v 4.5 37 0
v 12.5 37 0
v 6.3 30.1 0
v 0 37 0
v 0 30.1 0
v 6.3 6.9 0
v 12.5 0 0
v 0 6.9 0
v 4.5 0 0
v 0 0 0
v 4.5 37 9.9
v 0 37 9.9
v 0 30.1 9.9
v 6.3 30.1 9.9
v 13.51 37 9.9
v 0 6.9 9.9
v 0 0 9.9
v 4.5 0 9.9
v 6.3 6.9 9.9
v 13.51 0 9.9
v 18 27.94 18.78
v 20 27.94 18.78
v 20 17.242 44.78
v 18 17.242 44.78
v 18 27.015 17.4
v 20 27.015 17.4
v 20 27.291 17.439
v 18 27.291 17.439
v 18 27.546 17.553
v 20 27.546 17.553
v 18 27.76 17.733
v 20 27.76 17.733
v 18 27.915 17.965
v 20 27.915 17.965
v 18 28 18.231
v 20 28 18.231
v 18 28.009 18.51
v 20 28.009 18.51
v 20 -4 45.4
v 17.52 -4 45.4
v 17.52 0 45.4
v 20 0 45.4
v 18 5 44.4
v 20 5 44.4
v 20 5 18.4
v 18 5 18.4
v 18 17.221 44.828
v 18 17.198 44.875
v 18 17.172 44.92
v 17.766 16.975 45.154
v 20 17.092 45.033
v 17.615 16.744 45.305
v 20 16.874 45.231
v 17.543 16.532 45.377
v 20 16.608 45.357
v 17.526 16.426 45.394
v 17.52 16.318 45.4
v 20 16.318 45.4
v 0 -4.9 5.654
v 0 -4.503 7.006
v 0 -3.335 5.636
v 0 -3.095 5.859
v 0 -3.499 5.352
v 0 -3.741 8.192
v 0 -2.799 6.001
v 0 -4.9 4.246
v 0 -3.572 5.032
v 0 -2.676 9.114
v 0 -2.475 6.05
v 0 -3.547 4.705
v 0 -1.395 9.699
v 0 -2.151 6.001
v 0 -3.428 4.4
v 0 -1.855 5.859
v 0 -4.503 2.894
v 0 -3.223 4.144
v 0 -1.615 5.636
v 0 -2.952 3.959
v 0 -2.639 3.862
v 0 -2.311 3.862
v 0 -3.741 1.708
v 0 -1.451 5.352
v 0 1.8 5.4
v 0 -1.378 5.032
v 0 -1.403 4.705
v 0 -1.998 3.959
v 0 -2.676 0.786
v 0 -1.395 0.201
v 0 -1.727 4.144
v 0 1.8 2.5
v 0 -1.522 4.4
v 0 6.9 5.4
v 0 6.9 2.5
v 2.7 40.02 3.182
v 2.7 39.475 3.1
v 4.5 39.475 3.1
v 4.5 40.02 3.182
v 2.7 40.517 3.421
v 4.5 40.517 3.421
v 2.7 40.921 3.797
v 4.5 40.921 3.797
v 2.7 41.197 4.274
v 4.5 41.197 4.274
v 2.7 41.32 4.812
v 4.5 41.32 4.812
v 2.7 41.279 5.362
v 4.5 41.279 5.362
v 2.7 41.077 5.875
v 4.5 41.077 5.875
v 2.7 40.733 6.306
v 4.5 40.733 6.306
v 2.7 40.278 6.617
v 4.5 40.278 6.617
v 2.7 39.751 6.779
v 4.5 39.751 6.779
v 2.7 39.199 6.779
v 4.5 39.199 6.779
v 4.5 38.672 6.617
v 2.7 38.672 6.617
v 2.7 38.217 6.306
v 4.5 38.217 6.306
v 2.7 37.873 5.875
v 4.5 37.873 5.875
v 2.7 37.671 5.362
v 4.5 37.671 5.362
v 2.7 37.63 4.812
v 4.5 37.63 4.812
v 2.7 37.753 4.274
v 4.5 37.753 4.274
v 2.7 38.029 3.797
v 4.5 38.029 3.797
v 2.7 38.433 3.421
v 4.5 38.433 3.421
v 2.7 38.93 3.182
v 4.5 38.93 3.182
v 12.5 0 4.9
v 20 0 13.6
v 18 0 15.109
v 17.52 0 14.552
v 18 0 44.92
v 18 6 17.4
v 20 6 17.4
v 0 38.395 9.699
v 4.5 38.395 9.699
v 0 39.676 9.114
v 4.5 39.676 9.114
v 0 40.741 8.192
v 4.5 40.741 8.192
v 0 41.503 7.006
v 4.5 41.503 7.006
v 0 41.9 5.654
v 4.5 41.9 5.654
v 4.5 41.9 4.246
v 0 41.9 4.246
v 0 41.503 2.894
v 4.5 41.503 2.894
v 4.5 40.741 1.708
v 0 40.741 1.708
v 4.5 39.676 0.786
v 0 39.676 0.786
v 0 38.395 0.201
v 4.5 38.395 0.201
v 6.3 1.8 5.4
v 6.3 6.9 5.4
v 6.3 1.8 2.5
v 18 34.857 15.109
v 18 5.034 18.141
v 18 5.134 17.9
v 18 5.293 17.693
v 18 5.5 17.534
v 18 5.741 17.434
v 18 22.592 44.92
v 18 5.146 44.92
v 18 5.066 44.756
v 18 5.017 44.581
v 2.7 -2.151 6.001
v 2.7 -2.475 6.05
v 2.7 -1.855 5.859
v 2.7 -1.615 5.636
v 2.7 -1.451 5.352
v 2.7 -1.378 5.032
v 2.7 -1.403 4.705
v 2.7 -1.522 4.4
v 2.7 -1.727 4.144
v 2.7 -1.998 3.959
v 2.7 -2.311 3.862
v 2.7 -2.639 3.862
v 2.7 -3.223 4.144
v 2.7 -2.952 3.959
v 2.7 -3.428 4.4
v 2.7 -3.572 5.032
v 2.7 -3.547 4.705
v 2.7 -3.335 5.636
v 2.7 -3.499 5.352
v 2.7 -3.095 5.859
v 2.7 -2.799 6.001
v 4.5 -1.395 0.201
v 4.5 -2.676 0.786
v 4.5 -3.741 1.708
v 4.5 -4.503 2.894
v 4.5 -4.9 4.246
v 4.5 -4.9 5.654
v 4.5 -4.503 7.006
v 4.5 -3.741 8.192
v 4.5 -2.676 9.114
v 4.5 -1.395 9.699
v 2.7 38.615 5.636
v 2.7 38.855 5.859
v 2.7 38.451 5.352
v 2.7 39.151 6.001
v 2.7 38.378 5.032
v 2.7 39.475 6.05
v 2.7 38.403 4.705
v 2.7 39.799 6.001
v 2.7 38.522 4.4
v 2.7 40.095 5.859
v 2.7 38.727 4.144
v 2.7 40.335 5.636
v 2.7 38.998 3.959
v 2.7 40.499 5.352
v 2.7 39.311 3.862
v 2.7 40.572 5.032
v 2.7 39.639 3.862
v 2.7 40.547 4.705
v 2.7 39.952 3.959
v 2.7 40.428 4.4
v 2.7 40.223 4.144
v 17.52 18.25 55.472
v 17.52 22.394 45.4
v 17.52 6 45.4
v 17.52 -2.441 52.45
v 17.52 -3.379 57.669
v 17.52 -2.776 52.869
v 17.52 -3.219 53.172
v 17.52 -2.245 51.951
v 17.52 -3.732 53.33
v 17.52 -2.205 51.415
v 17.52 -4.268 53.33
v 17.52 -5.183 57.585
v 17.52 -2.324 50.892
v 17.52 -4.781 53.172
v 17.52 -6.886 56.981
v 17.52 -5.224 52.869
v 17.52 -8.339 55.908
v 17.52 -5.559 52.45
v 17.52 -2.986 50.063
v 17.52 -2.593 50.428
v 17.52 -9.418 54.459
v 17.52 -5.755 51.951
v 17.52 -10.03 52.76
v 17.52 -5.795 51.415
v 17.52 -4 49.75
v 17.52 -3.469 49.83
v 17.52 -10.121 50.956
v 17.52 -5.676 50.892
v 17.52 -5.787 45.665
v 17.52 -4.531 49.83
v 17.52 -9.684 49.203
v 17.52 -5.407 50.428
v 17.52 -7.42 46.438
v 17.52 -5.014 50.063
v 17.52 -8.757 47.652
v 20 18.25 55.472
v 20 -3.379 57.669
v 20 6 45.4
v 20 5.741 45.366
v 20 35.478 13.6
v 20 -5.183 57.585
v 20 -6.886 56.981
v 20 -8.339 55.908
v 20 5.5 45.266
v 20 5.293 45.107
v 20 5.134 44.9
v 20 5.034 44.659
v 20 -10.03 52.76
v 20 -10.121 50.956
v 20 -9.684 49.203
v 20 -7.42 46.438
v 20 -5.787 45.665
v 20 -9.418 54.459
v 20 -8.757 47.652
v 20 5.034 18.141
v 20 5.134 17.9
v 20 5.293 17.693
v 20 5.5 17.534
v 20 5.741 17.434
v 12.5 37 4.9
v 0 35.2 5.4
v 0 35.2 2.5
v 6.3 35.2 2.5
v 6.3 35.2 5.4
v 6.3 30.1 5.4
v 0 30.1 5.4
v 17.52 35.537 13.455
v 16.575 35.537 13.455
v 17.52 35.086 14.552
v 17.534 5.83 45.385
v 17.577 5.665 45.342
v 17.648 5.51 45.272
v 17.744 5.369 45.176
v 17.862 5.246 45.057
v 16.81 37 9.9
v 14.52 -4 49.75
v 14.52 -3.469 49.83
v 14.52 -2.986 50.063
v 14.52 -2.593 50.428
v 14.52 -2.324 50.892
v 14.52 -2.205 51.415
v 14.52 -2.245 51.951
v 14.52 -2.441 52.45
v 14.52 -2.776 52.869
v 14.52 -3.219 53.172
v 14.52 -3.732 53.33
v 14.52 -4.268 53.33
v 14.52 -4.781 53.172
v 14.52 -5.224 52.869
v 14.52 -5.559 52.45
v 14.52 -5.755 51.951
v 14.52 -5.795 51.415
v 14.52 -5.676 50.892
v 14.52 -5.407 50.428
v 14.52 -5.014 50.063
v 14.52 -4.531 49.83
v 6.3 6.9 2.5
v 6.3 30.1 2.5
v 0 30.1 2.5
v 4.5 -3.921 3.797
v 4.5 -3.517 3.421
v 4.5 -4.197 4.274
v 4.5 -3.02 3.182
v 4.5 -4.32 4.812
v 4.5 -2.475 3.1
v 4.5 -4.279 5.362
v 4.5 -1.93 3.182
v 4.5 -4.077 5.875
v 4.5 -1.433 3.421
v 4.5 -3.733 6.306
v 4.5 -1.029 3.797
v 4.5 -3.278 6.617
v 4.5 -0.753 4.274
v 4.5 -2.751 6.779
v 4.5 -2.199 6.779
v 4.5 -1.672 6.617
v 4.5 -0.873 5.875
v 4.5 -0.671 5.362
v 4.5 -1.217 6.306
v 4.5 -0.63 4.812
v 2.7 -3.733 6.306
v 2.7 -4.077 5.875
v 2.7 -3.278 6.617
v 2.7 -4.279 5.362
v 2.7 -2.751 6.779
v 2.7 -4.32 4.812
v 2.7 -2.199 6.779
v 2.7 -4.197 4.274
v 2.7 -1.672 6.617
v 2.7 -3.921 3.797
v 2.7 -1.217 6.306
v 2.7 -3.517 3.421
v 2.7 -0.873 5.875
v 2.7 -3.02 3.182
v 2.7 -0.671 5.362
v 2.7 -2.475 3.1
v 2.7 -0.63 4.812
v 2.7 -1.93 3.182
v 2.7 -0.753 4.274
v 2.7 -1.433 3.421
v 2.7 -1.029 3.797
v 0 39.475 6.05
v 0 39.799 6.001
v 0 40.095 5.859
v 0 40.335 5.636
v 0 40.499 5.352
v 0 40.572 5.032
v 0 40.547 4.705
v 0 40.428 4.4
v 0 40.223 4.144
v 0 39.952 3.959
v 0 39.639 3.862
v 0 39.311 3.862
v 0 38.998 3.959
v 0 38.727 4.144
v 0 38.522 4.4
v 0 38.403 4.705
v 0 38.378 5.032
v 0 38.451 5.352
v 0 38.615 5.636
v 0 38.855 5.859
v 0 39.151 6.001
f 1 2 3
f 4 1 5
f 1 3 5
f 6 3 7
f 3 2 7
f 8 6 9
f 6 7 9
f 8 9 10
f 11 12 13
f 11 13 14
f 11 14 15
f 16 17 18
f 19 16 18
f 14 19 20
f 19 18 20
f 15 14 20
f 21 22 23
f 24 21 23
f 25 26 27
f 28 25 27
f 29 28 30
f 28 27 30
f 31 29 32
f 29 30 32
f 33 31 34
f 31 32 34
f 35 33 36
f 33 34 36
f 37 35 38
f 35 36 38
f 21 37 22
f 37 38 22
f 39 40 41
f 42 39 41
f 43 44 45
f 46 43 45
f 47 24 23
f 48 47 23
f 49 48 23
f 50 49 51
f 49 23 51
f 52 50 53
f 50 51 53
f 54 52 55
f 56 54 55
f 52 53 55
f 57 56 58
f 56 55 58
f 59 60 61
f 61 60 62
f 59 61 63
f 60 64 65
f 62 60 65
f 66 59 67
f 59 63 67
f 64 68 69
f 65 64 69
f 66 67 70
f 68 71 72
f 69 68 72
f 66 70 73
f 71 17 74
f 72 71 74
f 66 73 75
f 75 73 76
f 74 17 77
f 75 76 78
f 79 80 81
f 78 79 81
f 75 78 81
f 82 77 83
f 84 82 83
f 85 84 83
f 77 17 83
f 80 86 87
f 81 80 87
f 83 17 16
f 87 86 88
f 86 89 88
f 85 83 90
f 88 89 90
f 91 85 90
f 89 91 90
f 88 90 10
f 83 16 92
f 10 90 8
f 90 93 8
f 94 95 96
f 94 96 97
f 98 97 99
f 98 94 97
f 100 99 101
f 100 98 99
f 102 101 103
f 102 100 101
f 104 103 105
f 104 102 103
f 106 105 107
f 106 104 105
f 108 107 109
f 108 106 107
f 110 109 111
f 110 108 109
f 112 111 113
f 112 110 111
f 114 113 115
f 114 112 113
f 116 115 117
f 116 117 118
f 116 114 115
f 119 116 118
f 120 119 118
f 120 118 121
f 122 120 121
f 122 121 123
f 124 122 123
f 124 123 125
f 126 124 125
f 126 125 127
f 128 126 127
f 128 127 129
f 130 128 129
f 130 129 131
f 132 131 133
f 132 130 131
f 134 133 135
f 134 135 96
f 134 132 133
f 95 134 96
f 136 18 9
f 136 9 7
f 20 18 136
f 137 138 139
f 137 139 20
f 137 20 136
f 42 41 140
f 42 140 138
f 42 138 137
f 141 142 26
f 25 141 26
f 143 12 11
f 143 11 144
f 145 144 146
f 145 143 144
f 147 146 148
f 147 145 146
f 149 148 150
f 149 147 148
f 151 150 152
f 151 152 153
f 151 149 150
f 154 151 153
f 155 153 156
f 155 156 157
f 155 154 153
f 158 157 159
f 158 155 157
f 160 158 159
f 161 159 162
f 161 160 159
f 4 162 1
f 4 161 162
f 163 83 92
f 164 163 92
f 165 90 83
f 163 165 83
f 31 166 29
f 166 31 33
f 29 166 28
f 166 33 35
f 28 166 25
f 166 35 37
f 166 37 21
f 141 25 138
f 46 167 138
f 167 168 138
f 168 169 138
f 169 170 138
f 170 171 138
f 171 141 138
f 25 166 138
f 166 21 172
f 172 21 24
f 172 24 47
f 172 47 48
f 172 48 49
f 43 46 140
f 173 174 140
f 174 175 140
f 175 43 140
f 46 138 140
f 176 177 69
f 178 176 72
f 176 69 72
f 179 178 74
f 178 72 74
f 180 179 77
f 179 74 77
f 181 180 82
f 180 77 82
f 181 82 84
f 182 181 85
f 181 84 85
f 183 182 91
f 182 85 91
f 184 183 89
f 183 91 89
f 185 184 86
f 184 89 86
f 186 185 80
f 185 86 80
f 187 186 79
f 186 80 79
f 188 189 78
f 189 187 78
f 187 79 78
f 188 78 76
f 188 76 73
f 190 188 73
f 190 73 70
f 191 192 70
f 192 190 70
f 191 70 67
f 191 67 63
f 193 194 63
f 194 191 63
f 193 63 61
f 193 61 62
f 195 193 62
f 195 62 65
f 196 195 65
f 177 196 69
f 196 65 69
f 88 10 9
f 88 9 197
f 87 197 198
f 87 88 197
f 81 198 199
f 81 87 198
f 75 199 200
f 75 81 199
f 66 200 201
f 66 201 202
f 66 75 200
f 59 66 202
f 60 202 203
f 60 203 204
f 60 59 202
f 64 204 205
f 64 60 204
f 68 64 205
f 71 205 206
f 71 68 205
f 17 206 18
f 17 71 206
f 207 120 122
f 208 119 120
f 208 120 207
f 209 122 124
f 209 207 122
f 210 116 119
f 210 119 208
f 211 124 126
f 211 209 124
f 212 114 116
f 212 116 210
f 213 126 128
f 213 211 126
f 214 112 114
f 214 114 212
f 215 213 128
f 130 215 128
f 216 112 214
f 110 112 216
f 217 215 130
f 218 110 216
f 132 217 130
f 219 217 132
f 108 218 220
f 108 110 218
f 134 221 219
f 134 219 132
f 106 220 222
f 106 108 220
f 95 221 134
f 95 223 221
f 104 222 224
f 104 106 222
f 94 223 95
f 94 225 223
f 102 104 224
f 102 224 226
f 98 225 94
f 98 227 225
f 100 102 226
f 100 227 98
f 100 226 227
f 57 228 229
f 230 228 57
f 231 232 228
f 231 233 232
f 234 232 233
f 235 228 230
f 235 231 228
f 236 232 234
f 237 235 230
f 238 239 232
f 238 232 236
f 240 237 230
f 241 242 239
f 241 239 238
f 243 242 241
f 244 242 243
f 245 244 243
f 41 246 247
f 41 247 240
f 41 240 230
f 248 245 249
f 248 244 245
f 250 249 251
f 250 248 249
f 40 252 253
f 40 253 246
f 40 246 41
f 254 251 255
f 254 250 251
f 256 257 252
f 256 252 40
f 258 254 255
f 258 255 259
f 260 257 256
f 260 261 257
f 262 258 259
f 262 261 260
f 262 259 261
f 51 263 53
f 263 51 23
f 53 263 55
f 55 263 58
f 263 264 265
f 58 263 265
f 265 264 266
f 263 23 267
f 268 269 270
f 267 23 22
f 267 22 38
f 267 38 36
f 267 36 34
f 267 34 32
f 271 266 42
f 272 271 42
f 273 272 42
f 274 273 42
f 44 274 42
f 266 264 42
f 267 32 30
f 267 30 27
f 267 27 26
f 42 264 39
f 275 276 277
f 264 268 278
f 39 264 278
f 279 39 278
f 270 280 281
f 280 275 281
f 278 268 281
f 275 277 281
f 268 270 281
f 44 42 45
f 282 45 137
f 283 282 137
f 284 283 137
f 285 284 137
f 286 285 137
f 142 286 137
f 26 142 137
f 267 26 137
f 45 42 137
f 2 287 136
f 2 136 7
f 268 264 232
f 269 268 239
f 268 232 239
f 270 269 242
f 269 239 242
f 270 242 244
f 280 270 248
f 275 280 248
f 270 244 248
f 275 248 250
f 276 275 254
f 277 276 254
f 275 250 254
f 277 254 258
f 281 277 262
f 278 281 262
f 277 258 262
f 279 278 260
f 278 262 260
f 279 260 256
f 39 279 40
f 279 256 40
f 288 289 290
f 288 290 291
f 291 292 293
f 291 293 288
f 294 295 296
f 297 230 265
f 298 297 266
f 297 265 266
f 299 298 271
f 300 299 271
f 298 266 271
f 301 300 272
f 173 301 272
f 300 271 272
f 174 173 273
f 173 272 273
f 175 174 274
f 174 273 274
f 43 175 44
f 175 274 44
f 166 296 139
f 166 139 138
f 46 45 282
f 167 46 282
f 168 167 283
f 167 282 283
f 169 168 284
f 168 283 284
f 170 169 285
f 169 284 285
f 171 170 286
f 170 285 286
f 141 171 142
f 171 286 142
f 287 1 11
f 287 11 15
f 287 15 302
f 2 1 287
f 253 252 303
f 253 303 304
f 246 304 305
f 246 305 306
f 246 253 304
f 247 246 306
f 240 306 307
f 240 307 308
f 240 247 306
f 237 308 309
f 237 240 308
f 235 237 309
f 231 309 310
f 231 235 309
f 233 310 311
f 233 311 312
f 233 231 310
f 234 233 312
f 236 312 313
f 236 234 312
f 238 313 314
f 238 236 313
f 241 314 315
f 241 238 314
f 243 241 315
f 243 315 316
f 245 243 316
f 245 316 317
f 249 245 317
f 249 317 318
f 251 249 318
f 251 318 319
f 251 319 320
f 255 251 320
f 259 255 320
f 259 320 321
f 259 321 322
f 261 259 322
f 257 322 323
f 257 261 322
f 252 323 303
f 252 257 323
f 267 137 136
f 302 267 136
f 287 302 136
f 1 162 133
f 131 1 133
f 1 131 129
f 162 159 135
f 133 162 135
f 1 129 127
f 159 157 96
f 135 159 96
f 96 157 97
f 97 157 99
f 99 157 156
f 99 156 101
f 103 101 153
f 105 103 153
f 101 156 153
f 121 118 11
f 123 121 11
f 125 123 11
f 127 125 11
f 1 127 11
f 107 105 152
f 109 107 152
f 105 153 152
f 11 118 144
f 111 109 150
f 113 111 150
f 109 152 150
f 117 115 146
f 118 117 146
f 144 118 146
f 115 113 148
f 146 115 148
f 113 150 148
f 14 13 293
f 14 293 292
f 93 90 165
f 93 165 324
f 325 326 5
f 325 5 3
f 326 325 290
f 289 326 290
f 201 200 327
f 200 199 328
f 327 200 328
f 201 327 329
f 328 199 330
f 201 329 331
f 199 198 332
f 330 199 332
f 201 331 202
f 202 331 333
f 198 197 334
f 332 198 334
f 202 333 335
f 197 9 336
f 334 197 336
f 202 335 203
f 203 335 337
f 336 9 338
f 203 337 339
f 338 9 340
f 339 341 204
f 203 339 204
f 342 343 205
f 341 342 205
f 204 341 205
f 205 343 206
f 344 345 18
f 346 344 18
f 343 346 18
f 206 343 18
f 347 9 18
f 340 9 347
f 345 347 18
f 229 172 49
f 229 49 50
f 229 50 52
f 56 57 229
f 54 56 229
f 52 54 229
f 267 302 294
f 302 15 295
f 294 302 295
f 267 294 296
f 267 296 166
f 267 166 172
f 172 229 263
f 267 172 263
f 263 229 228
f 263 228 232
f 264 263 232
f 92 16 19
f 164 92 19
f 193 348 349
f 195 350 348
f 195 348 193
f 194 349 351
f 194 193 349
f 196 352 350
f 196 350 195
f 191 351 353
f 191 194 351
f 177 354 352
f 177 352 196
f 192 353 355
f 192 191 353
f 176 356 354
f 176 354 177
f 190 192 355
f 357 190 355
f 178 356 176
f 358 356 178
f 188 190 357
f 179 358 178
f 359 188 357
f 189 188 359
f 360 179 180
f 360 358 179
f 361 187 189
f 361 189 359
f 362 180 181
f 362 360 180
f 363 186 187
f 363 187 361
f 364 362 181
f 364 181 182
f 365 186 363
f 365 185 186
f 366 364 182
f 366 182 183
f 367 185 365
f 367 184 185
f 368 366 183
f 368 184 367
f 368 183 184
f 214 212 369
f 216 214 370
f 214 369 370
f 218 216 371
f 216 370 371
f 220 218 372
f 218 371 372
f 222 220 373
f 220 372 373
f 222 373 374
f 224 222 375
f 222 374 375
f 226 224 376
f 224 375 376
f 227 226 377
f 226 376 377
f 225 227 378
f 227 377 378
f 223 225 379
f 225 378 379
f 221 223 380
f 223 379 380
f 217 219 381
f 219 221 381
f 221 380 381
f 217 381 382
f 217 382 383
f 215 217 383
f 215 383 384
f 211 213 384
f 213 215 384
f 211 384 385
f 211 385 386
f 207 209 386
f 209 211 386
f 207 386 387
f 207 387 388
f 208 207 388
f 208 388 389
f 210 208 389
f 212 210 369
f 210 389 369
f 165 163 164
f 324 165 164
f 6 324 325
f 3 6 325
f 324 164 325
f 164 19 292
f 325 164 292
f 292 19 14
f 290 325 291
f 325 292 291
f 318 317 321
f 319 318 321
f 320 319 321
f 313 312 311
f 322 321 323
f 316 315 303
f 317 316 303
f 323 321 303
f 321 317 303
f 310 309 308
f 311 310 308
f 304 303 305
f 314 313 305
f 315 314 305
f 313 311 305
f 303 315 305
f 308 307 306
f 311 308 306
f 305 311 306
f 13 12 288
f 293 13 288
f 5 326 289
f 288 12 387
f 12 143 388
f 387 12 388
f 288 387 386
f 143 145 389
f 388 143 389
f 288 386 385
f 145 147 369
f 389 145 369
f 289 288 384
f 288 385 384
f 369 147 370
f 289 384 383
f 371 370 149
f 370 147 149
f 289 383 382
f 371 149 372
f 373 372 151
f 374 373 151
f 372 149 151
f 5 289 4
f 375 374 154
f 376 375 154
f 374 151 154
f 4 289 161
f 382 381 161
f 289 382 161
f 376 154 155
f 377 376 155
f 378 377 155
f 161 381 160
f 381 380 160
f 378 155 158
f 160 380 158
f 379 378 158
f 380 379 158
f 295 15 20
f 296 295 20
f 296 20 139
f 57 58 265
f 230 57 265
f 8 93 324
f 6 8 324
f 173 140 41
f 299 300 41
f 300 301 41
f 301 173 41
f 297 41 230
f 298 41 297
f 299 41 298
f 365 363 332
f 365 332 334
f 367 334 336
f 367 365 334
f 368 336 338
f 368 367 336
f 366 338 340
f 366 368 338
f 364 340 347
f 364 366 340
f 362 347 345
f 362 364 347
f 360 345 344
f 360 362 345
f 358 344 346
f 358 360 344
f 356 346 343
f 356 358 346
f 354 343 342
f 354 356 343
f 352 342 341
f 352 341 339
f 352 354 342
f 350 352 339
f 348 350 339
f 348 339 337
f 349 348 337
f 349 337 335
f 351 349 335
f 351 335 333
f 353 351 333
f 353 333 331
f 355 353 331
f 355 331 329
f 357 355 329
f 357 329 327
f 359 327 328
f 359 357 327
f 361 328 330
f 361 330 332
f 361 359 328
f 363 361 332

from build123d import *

# Parameters (mm, degrees)
SZKIC1_W                       = 9.9
SZKIC1_H                       = 37
DODANIE_WYCI_GNI_CIE1_DEPTH    = 12.5
DODANIE_WYCI_GNI_CIE2_DEPTH    = 7.5
WYTNIJ_WYCI_GNI_CIE1_START     = -47.15
WYTNIJ_WYCI_GNI_CIE1_OUTLINE_W = 17.51973865
WYTNIJ_WYCI_GNI_CIE1_OUTLINE_H = 49.213267073
WYTNIJ_WYCI_GNI_CIE1_DEPTH     = 47.15
SZKIC4_W                       = 6.3
SZKIC4_H                       = 23.2
WYTNIJ_WYCI_GNI_CIE2_DEPTH     = 57.5
BOSS_EXTRU_1_START             = -2.480261
ESQUISSE2_R                    = 1.8
BOSS_EXTRU_1_DEPTH             = 3
ENL_V_MAT_EXTRU_1_DEPTH        = 72.402310887
ESQUISSE4_W                    = 2.9
ESQUISSE4_H                    = 5.1
ENL_V_MAT_EXTRU_2_DEPTH        = 6.3
BOSS_EXTRU_2_DEPTH             = 37
ESQUISSE6_R                    = 1.1
BOSS_EXTRU_3_DEPTH             = 4.5
ENL_V_START                    = -1.8
ESQUISSE8_R                    = 1.85
ESQUISSE8_R_2                  = 1.1
ENL_V_MAT_EXTRU_5_DEPTH        = 1.8
BOSS_EXTRU_4_REACH             = 76.088
ENL_V_MAT_EXTRU_7_DEPTH        = 75.088410025
ENL_V_MAT_EXTRU_8_DEPTH        = 66.729440163


# Read off the part's stored shape, not the designer's step: Wytnij-wyciągnięcie1
with BuildPart() as part:
    # Szkic1 → Dodanie-wyciągnięcie1 (new body)
    with BuildSketch(Plane(origin=(0, 0, 0), x_dir=(0, 0, -1), z_dir=(1, 0, 0))):
        with Locations((-4.95, 18.5)):
            Rectangle(SZKIC1_W, SZKIC1_H)
    extrude(amount=DODANIE_WYCI_GNI_CIE1_DEPTH)

    # Szkic2 → Dodanie-wyciągnięcie2 (add)
    with BuildSketch(Plane(origin=(12.5, 0, 0), x_dir=(0, 0, -1), z_dir=(1, 0, 0))):
        with BuildLine():
            Line((-45.4, 0), (-7.4, 0))
            Line((-7.4, 0), (-7.4, 37))
            Line((-7.4, 37), (-9.9, 37))
            Line((-9.9, 37), (-55.472391365, 18.25))
            Line((-55.472391365, 18.25), (-57.668539629, -3.378732899))
            ThreePointArc((-57.668539629, -3.378732899), (-51.861031576, -10.142129872), (-45.4, -4))
            Line((-45.4, -4), (-45.4, 0))
        make_face()
    extrude(amount=DODANIE_WYCI_GNI_CIE2_DEPTH)

    # Wytnij-wyciągnięcie1 outline → Wytnij-wyciągnięcie1 (cut)
    with BuildSketch(Plane(origin=(0, 37, 0), x_dir=(1, 0, 0), z_dir=(0, 1, 0)).offset(WYTNIJ_WYCI_GNI_CIE1_START)):
        with Locations((8.759869325, -38.061906093)):
            Rectangle(WYTNIJ_WYCI_GNI_CIE1_OUTLINE_W, WYTNIJ_WYCI_GNI_CIE1_OUTLINE_H)
        Polygon((15, -7.4), (20, -12.4), (20, -7.4), align=None)
    extrude(amount=WYTNIJ_WYCI_GNI_CIE1_DEPTH, mode=Mode.SUBTRACT)

    # Szkic4 → Wytnij-wyciągnięcie2 (cut)
    with BuildSketch(Plane.XY.offset(9.9)):
        with Locations((3.15, 18.5)):
            Rectangle(SZKIC4_W, SZKIC4_H)
    extrude(amount=-WYTNIJ_WYCI_GNI_CIE2_DEPTH, mode=Mode.SUBTRACT)

    # Esquisse2 → Boss.-Extru.1 (add)
    with BuildSketch(Plane(origin=(20, 0, 0), x_dir=(0, 0, -1), z_dir=(1, 0, 0)).offset(BOSS_EXTRU_1_START)):
        with Locations((-51.55, -4)):
            Circle(ESQUISSE2_R)
    extrude(amount=-BOSS_EXTRU_1_DEPTH)

    # Esquisse3 → Enlèv. mat.-Extru.1 (cut, through all)
    with BuildSketch(Plane(origin=(20, 0, 0), x_dir=(0, 0, -1), z_dir=(1, 0, 0))):
        with BuildLine():
            Line((-17.4, 6), (-17.4, 27.014829056))
            ThreePointArc((-17.4, 27.014829056), (-17.843442614, 27.845638225), (-18.780487752, 27.939615015))
            Line((-18.780487752, 27.939615015), (-44.780487752, 17.242348855))
            ThreePointArc((-44.780487752, 17.242348855), (-45.230809169, 16.874120282), (-45.4, 16.317562896))
            Line((-45.4, 16.317562896), (-45.4, 6))
            ThreePointArc((-45.4, 6), (-45.107106781, 5.292893219), (-44.4, 5))
            Line((-44.4, 5), (-18.4, 5))
            ThreePointArc((-18.4, 5), (-17.692893219, 5.292893219), (-17.4, 6))
        make_face()
    extrude(amount=-ENL_V_MAT_EXTRU_1_DEPTH, mode=Mode.SUBTRACT)

    # Esquisse4 → Enlèv. mat.-Extru.2 (cut)
    with BuildSketch(Plane.ZY):
        with Locations((3.95, 32.65)):
            Rectangle(ESQUISSE4_W, ESQUISSE4_H)
        with Locations((3.95, 4.35)):
            Rectangle(ESQUISSE4_W, ESQUISSE4_H)
    extrude(amount=-ENL_V_MAT_EXTRU_2_DEPTH, mode=Mode.SUBTRACT)

    # Esquisse5 → Boss.-Extru.2 (add)
    with BuildSketch(Plane.XZ):
        Polygon((12.5, 4.9), (15, 7.4), (12.5, 7.4), align=None)
    extrude(amount=-BOSS_EXTRU_2_DEPTH)

    # Esquisse6 → Boss.-Extru.3 (add)
    # profile 1 of 3: a face of its own
    with BuildSketch(Plane.ZY):
        Polygon((2.5, 30.1), (2.5, 35.2), (5.4, 35.2), (5.4, 30.1), (9.9, 30.1), (9.9, 37), (0, 37), (0, 30.1), align=None)
    # profile 2 of 3: a face of its own
    with BuildSketch(Plane.ZY):
        with BuildLine():
            ThreePointArc((9.9, 37), (4.95, 41.95), (0, 37))
            Line((0, 37), (9.9, 37))
        make_face()
        with Locations((4.95, 39.475)):
            Circle(ESQUISSE6_R, mode=Mode.SUBTRACT)
    # profile 3 of 3: a face of its own
    with BuildSketch(Plane.ZY):
        with BuildLine():
            ThreePointArc((0, 0), (4.95, -4.95), (9.9, 0))
            Line((9.9, 0), (0, 0))
        make_face()
        with Locations((4.95, -2.475)):
            Circle(ESQUISSE6_R, mode=Mode.SUBTRACT)
    extrude(amount=-BOSS_EXTRU_3_DEPTH)

    # Esquisse8 → Enlèv. mat.-Extru.5 (cut)
    # profile 1 of 2: a face of its own
    with BuildSketch(Plane(origin=(4.5, 0, 0), x_dir=(0, 0, -1), z_dir=(1, 0, 0)).offset(ENL_V_START)):
        with Locations((-4.95, 39.475)):
            Circle(ESQUISSE8_R)
        with Locations(Location((-4.95, 39.475, 0), (0, 0, 180))):
            Circle(ESQUISSE8_R_2, mode=Mode.SUBTRACT)
    # profile 2 of 2: a face of its own
    with BuildSketch(Plane(origin=(4.5, 0, 0), x_dir=(0, 0, -1), z_dir=(1, 0, 0)).offset(ENL_V_START)):
        with Locations((-4.95, -2.475)):
            Circle(ESQUISSE8_R)
        with Locations(Location((-4.95, -2.475, 0), (0, 0, 180))):
            Circle(ESQUISSE8_R_2, mode=Mode.SUBTRACT)
    extrude(amount=ENL_V_MAT_EXTRU_5_DEPTH, mode=Mode.SUBTRACT)

    # Boss.-Extru.4: up to this face of the body (flat: up to its plane)
    boss_extru_4_end = Plane(part.part.faces().sort_by_distance((9.272446383, 37, 5.397564522))[0])
    # Esquisse10 → Boss.-Extru.4 (add, up to the picked face)
    with BuildSketch(Plane.XZ, mode=Mode.PRIVATE) as boss_extru_4_sk1:
        Polygon((20, 0), (12.5, 0), (12.5, 4.9), (20, 12.4), align=None)
    boss_extru_4_tool1 = split(extrude(boss_extru_4_sk1.sketch, amount=-BOSS_EXTRU_4_REACH, mode=Mode.PRIVATE), bisect_by=boss_extru_4_end, keep=Keep.BOTH, mode=Mode.PRIVATE)
    # Esquisse10 → Boss.-Extru.4 (add, up to the picked face)
    with BuildSketch(Plane.XZ, mode=Mode.PRIVATE) as boss_extru_4_sk2:
        Polygon((17.51973865, 13.455272556), (17.51973865, 18.475011205), (12.5, 13.455272556), align=None)
    boss_extru_4_tool2 = split(extrude(boss_extru_4_sk2.sketch, amount=-BOSS_EXTRU_4_REACH, mode=Mode.PRIVATE), bisect_by=boss_extru_4_end, keep=Keep.BOTH, mode=Mode.PRIVATE)
    add(boss_extru_4_tool1.solids().sort_by(Axis((16.791908, 0, 4.595954), (0, 1, 0)))[0])
    add(boss_extru_4_tool2.solids().sort_by(Axis((15.846492, 0, 15.128519), (0, 1, 0)))[0])

    # Esquisse11 → Enlèv. mat.-Extru.7 (cut, through all)
    with BuildSketch(Plane.XZ):
        Polygon((17.51973865, 18.475011205), (18, 18.955272556), (18, 44.91973865), (17.51973865, 45.4), align=None)
        Polygon((12.5, 13.455272556), (12.5, 9.9), (13.509622462, 9.9), (17.51973865, 14.551734777), (17.51973865, 18.475011205), align=None)
        Polygon((17.51973865, 14.551734777), (18, 15.108837944), (18, 18.955272556), (17.51973865, 18.475011205), align=None)
        Polygon((12.5, 4.9), (12.5, 0), (20, 0), (20, 13.6), align=None)
    extrude(amount=-ENL_V_MAT_EXTRU_7_DEPTH, mode=Mode.SUBTRACT)

    # Esquisse12 → Enlèv. mat.-Extru.8 (cut, through all)
    with BuildSketch(Plane(origin=(0, 35.126985948, 14.452412235), x_dir=(1, 0, 0), z_dir=(0, 0.9247859593811136, 0.3804877518811259))):
        Polygon((20, -44.356187196), (20, 0.921740026), (16.810344828, 4.922665822), (13.509622462, 4.922665822), (16.574512596, 1.078238341), (17.51973865, 1.078238341), (17.51973865, -0.107400574), (18, -0.709813663), (18, -32.945273559), (17.51973865, -33.464595187), (17.51973865, -44.356187196), align=None)
        Polygon((16.574512596, 1.078238341), (17.51973865, -0.107400574), (17.51973865, 1.078238341), align=None)
    extrude(amount=ENL_V_MAT_EXTRU_8_DEPTH, mode=Mode.SUBTRACT)


solid = part.part
